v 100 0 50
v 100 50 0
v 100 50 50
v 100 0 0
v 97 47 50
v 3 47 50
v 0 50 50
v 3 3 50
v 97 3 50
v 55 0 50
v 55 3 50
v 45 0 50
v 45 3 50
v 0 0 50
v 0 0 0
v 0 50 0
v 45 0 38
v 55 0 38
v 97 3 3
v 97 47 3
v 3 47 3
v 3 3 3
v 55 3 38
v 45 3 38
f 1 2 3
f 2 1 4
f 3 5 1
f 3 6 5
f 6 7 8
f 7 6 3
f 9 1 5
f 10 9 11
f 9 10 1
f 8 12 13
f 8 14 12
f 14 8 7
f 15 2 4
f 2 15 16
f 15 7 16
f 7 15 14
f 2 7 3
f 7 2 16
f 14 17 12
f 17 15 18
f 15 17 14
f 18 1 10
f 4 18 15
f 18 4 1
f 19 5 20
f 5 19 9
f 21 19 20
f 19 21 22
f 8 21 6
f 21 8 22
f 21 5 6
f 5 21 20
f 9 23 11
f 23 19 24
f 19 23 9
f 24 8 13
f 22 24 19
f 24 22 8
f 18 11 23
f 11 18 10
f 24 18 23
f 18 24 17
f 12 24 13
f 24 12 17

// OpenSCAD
$fn = 32;

// ----------------------------------------------------------------------
// Enclosure box: notch enclosure
// ----------------------------------------------------------------------

// --- parameters (mm) ---
box_l = 100;              // outer length, X
box_w = 50;               // outer width, Y
box_h = 50;               // outer height
wall_t = 3;               // wall thickness
notch_w = 10;             // cable notch width
notch_h = 12;             // cable notch height
fit_tol = 0.1;            // tolerance for press fits, mm
free_tol = 0.3;           // tolerance for clearance fits, mm

inner_h = box_h - wall_t;  // cavity depth
boss_h = inner_h - 2;  // corner boss height

difference() {
  cube([box_l, box_w, box_h]);
  translate([wall_t, wall_t, wall_t])
    cube([box_l - 2 * wall_t, box_w - 2 * wall_t, box_h]);
  translate([box_l / 2 - notch_w / 2, -1, box_h - notch_h])
    cube([notch_w, wall_t + 2, notch_h + 1]);
}
